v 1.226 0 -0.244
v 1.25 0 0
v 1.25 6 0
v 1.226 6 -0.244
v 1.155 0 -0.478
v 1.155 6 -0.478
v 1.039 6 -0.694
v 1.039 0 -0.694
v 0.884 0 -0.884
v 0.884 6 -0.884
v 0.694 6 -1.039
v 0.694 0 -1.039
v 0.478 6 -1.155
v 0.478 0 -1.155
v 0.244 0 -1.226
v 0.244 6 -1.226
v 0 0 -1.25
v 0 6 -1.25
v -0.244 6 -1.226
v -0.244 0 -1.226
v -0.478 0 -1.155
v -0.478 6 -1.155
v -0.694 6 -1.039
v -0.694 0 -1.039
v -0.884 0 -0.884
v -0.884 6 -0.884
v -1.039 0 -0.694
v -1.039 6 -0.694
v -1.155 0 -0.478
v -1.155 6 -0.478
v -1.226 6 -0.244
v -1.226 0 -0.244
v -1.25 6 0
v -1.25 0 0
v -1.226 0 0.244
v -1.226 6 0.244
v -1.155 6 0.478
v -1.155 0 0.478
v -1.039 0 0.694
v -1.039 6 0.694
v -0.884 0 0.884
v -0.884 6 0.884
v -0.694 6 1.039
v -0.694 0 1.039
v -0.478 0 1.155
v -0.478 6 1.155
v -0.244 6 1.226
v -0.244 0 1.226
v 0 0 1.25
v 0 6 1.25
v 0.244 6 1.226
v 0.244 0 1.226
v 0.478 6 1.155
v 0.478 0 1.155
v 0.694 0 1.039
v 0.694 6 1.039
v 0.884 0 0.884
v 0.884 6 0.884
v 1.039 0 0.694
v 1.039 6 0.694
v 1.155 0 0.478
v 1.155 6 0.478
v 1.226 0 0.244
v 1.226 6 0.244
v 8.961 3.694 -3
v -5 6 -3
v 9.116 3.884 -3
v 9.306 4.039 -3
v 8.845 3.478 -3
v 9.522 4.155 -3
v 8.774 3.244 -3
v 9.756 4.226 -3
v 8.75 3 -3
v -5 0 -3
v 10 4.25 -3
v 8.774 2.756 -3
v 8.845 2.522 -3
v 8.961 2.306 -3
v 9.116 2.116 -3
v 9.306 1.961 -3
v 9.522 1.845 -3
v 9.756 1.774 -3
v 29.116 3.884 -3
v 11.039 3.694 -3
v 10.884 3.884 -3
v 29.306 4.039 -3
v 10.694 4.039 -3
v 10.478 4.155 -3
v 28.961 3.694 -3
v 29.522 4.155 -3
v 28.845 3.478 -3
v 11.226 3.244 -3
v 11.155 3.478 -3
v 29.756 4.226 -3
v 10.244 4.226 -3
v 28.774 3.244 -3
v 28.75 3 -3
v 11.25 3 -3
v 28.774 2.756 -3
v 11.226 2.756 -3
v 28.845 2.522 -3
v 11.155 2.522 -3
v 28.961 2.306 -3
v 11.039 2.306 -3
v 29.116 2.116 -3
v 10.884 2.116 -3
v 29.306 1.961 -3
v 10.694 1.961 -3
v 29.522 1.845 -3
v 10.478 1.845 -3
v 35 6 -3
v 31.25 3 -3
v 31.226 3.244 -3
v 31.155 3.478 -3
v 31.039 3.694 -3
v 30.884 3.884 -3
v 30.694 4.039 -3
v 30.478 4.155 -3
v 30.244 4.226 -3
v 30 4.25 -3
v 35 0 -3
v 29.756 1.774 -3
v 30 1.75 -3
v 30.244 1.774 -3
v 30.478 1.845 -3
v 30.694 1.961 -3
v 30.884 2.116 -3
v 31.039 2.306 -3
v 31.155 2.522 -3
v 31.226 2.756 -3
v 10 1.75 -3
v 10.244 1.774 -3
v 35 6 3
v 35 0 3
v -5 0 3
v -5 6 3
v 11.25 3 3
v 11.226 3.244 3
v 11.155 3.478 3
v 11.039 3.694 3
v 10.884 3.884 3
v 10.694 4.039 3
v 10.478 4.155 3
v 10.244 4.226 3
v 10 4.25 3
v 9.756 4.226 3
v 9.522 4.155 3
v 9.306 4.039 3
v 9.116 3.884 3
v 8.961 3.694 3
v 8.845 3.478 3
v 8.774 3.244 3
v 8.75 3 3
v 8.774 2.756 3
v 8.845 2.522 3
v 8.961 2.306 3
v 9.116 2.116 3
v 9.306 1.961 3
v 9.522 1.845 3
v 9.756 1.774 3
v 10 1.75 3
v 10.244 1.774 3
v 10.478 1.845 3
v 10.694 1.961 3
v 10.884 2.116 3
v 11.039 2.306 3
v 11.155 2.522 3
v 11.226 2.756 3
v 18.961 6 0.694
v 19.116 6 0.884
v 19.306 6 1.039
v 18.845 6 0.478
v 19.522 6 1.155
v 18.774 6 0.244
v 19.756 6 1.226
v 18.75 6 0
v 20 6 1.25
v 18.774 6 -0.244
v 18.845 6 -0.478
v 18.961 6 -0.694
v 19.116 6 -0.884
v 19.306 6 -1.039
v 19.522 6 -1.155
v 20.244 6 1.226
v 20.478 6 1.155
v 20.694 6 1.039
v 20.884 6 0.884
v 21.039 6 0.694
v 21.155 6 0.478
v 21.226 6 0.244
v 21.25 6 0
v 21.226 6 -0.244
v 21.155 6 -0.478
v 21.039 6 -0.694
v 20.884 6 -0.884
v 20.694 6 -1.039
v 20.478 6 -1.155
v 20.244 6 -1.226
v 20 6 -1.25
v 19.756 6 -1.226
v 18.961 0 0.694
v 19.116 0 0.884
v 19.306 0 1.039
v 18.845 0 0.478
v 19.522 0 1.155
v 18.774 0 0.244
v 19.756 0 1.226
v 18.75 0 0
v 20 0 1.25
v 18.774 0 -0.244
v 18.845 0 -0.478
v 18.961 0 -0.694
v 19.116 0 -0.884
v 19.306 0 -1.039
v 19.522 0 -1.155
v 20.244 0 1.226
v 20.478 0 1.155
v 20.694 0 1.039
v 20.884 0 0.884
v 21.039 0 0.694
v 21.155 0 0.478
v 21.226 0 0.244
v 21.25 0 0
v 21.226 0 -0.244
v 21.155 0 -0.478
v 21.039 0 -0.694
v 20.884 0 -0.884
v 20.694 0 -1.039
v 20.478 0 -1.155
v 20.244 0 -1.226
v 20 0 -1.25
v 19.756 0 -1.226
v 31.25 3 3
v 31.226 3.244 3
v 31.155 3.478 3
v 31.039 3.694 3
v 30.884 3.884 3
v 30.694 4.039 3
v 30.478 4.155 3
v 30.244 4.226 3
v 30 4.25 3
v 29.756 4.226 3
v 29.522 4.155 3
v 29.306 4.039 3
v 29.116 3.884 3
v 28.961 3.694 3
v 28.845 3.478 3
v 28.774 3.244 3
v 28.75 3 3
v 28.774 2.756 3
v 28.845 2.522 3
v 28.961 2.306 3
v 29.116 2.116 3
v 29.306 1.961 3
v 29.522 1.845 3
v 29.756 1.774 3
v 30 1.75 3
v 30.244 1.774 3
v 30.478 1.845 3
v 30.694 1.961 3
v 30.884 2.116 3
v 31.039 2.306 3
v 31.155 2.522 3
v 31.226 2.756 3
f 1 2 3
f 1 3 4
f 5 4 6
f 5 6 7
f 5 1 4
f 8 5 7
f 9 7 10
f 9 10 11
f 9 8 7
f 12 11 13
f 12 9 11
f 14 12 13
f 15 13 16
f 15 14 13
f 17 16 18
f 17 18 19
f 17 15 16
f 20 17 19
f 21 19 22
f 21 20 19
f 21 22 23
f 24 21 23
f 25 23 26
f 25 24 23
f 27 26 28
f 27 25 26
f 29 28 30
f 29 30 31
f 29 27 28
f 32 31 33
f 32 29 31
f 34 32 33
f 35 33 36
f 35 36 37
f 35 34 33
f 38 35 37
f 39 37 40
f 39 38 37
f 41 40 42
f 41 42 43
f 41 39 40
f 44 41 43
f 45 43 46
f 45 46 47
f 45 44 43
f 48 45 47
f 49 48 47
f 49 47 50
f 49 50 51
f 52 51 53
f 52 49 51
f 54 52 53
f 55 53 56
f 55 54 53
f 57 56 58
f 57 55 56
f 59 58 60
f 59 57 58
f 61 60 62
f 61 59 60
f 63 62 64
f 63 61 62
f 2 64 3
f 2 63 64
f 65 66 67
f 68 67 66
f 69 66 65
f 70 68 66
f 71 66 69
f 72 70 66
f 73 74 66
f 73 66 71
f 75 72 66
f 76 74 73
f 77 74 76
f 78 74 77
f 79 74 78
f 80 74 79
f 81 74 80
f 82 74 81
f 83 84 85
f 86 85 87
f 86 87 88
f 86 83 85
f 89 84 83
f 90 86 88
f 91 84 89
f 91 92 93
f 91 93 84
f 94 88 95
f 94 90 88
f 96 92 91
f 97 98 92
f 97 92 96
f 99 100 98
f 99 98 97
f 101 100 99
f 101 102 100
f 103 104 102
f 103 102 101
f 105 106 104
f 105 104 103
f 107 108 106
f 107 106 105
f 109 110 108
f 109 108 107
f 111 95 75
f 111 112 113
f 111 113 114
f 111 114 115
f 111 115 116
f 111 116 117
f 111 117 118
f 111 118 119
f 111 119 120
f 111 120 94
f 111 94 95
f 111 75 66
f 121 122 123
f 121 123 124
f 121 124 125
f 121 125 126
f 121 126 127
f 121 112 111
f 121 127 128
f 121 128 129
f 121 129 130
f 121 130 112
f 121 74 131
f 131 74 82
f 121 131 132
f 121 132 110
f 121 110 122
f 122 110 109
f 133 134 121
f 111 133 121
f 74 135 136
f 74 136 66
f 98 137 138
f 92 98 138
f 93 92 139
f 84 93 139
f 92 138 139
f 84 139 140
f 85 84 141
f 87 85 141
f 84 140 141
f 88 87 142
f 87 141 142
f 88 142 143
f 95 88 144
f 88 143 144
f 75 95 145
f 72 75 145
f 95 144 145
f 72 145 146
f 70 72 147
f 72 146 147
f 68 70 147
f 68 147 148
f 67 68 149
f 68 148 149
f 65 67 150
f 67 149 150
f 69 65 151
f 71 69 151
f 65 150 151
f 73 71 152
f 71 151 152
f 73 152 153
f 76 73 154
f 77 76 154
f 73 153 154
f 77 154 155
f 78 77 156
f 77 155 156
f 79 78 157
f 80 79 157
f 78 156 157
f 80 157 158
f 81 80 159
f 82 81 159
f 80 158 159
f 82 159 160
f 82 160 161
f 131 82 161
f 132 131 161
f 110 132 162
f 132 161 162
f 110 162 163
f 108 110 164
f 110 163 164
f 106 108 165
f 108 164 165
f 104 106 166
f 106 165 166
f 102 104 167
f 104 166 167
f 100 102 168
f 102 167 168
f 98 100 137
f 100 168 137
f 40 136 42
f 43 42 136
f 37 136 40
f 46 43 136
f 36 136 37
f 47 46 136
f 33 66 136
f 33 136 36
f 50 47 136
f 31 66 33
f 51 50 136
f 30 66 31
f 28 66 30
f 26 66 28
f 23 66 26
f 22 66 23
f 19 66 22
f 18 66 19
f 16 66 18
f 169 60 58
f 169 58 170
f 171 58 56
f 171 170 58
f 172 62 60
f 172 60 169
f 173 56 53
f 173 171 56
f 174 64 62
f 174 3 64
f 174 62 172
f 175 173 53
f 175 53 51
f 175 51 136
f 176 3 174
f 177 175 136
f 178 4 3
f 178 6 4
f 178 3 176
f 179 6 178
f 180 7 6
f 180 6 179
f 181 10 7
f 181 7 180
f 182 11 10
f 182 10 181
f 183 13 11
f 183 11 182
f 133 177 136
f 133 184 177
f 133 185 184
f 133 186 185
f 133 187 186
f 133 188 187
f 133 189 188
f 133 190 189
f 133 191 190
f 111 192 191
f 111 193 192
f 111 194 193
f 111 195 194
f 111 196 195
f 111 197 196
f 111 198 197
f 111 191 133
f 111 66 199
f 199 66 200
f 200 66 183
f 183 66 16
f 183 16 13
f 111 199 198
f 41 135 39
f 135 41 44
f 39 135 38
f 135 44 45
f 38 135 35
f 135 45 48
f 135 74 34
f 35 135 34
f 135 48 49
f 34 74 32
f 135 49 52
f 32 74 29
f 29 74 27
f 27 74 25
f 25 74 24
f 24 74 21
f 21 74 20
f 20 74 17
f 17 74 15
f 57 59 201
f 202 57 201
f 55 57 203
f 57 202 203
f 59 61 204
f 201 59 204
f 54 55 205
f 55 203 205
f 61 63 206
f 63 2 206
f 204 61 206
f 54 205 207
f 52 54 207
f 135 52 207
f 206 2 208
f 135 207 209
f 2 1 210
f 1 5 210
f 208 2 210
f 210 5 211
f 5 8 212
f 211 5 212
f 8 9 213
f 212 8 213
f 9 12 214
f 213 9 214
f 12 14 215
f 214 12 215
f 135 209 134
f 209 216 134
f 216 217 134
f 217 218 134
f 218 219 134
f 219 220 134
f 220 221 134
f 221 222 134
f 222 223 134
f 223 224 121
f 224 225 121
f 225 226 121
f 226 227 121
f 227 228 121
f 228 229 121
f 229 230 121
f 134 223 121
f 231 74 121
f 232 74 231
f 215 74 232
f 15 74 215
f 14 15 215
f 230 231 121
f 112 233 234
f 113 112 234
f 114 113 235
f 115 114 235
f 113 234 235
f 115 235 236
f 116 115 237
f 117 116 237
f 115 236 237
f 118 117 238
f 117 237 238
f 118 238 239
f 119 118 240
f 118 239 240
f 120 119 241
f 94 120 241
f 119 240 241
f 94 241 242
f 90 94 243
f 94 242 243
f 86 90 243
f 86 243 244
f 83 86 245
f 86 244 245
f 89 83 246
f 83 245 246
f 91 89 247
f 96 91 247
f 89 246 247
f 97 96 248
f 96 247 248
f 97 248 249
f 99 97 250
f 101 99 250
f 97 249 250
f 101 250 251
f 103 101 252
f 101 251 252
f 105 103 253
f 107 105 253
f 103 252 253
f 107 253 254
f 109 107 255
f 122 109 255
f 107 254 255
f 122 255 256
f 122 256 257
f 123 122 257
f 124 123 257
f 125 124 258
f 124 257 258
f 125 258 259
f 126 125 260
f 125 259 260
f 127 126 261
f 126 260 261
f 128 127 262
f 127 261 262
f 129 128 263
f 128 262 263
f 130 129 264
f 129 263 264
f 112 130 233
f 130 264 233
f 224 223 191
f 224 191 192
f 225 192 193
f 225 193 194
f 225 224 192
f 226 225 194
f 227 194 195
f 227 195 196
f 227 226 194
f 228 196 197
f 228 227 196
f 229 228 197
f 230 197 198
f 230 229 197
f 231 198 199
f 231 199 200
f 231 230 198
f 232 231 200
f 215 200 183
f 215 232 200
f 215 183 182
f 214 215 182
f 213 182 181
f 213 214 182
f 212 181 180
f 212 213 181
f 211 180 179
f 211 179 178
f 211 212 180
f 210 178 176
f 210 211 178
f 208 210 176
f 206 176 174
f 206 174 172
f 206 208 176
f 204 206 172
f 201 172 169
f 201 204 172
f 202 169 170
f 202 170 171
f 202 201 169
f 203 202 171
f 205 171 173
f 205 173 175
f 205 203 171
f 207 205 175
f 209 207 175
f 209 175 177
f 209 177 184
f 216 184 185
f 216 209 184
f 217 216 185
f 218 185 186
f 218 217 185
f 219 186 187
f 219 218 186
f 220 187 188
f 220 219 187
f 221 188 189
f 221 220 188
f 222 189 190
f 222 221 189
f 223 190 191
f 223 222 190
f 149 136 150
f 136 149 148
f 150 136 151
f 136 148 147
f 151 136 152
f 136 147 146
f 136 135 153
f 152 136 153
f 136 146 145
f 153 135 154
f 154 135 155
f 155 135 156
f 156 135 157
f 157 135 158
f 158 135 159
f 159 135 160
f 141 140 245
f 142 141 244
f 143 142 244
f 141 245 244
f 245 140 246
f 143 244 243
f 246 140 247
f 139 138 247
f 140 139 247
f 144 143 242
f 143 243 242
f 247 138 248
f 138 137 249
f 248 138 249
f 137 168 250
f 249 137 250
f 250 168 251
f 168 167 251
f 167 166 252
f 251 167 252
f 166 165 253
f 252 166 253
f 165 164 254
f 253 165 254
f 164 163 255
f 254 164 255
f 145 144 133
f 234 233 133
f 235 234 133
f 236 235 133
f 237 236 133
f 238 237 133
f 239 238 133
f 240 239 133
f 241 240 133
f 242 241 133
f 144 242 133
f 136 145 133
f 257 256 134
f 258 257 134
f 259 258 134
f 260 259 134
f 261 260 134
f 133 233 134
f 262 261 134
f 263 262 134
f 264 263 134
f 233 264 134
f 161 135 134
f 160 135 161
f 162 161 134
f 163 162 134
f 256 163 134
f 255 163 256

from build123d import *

# Parameters (mm, degrees)
SKETCH1_W           = 40
SKETCH1_H           = 6
SKETCH1_R           = 1.25
BOSS_EXTRUDE1_DEPTH = 6
SKETCH2_R           = 1.25
CUT_EXTRUDE1_DEPTH  = 6


with BuildPart() as part:
    # Sketch1 → Boss-Extrude1 (new body)
    with BuildSketch(Plane(origin=(0, 0, 0), x_dir=(1, 0, 0), z_dir=(0, 1, 0))):
        with Locations((15, 0)):
            Rectangle(SKETCH1_W, SKETCH1_H)
        Circle(SKETCH1_R, mode=Mode.SUBTRACT)
        with Locations((20, 0)):
            Circle(SKETCH1_R, mode=Mode.SUBTRACT)
    extrude(amount=BOSS_EXTRUDE1_DEPTH)

    # Sketch2 → Cut-Extrude1 (cut)
    with BuildSketch(Plane.XY.offset(3)):
        with Locations((10, 3)):
            Circle(SKETCH2_R)
        with Locations((30, 3)):
            Circle(SKETCH2_R)
    extrude(amount=-CUT_EXTRUDE1_DEPTH, mode=Mode.SUBTRACT)


solid = part.part
